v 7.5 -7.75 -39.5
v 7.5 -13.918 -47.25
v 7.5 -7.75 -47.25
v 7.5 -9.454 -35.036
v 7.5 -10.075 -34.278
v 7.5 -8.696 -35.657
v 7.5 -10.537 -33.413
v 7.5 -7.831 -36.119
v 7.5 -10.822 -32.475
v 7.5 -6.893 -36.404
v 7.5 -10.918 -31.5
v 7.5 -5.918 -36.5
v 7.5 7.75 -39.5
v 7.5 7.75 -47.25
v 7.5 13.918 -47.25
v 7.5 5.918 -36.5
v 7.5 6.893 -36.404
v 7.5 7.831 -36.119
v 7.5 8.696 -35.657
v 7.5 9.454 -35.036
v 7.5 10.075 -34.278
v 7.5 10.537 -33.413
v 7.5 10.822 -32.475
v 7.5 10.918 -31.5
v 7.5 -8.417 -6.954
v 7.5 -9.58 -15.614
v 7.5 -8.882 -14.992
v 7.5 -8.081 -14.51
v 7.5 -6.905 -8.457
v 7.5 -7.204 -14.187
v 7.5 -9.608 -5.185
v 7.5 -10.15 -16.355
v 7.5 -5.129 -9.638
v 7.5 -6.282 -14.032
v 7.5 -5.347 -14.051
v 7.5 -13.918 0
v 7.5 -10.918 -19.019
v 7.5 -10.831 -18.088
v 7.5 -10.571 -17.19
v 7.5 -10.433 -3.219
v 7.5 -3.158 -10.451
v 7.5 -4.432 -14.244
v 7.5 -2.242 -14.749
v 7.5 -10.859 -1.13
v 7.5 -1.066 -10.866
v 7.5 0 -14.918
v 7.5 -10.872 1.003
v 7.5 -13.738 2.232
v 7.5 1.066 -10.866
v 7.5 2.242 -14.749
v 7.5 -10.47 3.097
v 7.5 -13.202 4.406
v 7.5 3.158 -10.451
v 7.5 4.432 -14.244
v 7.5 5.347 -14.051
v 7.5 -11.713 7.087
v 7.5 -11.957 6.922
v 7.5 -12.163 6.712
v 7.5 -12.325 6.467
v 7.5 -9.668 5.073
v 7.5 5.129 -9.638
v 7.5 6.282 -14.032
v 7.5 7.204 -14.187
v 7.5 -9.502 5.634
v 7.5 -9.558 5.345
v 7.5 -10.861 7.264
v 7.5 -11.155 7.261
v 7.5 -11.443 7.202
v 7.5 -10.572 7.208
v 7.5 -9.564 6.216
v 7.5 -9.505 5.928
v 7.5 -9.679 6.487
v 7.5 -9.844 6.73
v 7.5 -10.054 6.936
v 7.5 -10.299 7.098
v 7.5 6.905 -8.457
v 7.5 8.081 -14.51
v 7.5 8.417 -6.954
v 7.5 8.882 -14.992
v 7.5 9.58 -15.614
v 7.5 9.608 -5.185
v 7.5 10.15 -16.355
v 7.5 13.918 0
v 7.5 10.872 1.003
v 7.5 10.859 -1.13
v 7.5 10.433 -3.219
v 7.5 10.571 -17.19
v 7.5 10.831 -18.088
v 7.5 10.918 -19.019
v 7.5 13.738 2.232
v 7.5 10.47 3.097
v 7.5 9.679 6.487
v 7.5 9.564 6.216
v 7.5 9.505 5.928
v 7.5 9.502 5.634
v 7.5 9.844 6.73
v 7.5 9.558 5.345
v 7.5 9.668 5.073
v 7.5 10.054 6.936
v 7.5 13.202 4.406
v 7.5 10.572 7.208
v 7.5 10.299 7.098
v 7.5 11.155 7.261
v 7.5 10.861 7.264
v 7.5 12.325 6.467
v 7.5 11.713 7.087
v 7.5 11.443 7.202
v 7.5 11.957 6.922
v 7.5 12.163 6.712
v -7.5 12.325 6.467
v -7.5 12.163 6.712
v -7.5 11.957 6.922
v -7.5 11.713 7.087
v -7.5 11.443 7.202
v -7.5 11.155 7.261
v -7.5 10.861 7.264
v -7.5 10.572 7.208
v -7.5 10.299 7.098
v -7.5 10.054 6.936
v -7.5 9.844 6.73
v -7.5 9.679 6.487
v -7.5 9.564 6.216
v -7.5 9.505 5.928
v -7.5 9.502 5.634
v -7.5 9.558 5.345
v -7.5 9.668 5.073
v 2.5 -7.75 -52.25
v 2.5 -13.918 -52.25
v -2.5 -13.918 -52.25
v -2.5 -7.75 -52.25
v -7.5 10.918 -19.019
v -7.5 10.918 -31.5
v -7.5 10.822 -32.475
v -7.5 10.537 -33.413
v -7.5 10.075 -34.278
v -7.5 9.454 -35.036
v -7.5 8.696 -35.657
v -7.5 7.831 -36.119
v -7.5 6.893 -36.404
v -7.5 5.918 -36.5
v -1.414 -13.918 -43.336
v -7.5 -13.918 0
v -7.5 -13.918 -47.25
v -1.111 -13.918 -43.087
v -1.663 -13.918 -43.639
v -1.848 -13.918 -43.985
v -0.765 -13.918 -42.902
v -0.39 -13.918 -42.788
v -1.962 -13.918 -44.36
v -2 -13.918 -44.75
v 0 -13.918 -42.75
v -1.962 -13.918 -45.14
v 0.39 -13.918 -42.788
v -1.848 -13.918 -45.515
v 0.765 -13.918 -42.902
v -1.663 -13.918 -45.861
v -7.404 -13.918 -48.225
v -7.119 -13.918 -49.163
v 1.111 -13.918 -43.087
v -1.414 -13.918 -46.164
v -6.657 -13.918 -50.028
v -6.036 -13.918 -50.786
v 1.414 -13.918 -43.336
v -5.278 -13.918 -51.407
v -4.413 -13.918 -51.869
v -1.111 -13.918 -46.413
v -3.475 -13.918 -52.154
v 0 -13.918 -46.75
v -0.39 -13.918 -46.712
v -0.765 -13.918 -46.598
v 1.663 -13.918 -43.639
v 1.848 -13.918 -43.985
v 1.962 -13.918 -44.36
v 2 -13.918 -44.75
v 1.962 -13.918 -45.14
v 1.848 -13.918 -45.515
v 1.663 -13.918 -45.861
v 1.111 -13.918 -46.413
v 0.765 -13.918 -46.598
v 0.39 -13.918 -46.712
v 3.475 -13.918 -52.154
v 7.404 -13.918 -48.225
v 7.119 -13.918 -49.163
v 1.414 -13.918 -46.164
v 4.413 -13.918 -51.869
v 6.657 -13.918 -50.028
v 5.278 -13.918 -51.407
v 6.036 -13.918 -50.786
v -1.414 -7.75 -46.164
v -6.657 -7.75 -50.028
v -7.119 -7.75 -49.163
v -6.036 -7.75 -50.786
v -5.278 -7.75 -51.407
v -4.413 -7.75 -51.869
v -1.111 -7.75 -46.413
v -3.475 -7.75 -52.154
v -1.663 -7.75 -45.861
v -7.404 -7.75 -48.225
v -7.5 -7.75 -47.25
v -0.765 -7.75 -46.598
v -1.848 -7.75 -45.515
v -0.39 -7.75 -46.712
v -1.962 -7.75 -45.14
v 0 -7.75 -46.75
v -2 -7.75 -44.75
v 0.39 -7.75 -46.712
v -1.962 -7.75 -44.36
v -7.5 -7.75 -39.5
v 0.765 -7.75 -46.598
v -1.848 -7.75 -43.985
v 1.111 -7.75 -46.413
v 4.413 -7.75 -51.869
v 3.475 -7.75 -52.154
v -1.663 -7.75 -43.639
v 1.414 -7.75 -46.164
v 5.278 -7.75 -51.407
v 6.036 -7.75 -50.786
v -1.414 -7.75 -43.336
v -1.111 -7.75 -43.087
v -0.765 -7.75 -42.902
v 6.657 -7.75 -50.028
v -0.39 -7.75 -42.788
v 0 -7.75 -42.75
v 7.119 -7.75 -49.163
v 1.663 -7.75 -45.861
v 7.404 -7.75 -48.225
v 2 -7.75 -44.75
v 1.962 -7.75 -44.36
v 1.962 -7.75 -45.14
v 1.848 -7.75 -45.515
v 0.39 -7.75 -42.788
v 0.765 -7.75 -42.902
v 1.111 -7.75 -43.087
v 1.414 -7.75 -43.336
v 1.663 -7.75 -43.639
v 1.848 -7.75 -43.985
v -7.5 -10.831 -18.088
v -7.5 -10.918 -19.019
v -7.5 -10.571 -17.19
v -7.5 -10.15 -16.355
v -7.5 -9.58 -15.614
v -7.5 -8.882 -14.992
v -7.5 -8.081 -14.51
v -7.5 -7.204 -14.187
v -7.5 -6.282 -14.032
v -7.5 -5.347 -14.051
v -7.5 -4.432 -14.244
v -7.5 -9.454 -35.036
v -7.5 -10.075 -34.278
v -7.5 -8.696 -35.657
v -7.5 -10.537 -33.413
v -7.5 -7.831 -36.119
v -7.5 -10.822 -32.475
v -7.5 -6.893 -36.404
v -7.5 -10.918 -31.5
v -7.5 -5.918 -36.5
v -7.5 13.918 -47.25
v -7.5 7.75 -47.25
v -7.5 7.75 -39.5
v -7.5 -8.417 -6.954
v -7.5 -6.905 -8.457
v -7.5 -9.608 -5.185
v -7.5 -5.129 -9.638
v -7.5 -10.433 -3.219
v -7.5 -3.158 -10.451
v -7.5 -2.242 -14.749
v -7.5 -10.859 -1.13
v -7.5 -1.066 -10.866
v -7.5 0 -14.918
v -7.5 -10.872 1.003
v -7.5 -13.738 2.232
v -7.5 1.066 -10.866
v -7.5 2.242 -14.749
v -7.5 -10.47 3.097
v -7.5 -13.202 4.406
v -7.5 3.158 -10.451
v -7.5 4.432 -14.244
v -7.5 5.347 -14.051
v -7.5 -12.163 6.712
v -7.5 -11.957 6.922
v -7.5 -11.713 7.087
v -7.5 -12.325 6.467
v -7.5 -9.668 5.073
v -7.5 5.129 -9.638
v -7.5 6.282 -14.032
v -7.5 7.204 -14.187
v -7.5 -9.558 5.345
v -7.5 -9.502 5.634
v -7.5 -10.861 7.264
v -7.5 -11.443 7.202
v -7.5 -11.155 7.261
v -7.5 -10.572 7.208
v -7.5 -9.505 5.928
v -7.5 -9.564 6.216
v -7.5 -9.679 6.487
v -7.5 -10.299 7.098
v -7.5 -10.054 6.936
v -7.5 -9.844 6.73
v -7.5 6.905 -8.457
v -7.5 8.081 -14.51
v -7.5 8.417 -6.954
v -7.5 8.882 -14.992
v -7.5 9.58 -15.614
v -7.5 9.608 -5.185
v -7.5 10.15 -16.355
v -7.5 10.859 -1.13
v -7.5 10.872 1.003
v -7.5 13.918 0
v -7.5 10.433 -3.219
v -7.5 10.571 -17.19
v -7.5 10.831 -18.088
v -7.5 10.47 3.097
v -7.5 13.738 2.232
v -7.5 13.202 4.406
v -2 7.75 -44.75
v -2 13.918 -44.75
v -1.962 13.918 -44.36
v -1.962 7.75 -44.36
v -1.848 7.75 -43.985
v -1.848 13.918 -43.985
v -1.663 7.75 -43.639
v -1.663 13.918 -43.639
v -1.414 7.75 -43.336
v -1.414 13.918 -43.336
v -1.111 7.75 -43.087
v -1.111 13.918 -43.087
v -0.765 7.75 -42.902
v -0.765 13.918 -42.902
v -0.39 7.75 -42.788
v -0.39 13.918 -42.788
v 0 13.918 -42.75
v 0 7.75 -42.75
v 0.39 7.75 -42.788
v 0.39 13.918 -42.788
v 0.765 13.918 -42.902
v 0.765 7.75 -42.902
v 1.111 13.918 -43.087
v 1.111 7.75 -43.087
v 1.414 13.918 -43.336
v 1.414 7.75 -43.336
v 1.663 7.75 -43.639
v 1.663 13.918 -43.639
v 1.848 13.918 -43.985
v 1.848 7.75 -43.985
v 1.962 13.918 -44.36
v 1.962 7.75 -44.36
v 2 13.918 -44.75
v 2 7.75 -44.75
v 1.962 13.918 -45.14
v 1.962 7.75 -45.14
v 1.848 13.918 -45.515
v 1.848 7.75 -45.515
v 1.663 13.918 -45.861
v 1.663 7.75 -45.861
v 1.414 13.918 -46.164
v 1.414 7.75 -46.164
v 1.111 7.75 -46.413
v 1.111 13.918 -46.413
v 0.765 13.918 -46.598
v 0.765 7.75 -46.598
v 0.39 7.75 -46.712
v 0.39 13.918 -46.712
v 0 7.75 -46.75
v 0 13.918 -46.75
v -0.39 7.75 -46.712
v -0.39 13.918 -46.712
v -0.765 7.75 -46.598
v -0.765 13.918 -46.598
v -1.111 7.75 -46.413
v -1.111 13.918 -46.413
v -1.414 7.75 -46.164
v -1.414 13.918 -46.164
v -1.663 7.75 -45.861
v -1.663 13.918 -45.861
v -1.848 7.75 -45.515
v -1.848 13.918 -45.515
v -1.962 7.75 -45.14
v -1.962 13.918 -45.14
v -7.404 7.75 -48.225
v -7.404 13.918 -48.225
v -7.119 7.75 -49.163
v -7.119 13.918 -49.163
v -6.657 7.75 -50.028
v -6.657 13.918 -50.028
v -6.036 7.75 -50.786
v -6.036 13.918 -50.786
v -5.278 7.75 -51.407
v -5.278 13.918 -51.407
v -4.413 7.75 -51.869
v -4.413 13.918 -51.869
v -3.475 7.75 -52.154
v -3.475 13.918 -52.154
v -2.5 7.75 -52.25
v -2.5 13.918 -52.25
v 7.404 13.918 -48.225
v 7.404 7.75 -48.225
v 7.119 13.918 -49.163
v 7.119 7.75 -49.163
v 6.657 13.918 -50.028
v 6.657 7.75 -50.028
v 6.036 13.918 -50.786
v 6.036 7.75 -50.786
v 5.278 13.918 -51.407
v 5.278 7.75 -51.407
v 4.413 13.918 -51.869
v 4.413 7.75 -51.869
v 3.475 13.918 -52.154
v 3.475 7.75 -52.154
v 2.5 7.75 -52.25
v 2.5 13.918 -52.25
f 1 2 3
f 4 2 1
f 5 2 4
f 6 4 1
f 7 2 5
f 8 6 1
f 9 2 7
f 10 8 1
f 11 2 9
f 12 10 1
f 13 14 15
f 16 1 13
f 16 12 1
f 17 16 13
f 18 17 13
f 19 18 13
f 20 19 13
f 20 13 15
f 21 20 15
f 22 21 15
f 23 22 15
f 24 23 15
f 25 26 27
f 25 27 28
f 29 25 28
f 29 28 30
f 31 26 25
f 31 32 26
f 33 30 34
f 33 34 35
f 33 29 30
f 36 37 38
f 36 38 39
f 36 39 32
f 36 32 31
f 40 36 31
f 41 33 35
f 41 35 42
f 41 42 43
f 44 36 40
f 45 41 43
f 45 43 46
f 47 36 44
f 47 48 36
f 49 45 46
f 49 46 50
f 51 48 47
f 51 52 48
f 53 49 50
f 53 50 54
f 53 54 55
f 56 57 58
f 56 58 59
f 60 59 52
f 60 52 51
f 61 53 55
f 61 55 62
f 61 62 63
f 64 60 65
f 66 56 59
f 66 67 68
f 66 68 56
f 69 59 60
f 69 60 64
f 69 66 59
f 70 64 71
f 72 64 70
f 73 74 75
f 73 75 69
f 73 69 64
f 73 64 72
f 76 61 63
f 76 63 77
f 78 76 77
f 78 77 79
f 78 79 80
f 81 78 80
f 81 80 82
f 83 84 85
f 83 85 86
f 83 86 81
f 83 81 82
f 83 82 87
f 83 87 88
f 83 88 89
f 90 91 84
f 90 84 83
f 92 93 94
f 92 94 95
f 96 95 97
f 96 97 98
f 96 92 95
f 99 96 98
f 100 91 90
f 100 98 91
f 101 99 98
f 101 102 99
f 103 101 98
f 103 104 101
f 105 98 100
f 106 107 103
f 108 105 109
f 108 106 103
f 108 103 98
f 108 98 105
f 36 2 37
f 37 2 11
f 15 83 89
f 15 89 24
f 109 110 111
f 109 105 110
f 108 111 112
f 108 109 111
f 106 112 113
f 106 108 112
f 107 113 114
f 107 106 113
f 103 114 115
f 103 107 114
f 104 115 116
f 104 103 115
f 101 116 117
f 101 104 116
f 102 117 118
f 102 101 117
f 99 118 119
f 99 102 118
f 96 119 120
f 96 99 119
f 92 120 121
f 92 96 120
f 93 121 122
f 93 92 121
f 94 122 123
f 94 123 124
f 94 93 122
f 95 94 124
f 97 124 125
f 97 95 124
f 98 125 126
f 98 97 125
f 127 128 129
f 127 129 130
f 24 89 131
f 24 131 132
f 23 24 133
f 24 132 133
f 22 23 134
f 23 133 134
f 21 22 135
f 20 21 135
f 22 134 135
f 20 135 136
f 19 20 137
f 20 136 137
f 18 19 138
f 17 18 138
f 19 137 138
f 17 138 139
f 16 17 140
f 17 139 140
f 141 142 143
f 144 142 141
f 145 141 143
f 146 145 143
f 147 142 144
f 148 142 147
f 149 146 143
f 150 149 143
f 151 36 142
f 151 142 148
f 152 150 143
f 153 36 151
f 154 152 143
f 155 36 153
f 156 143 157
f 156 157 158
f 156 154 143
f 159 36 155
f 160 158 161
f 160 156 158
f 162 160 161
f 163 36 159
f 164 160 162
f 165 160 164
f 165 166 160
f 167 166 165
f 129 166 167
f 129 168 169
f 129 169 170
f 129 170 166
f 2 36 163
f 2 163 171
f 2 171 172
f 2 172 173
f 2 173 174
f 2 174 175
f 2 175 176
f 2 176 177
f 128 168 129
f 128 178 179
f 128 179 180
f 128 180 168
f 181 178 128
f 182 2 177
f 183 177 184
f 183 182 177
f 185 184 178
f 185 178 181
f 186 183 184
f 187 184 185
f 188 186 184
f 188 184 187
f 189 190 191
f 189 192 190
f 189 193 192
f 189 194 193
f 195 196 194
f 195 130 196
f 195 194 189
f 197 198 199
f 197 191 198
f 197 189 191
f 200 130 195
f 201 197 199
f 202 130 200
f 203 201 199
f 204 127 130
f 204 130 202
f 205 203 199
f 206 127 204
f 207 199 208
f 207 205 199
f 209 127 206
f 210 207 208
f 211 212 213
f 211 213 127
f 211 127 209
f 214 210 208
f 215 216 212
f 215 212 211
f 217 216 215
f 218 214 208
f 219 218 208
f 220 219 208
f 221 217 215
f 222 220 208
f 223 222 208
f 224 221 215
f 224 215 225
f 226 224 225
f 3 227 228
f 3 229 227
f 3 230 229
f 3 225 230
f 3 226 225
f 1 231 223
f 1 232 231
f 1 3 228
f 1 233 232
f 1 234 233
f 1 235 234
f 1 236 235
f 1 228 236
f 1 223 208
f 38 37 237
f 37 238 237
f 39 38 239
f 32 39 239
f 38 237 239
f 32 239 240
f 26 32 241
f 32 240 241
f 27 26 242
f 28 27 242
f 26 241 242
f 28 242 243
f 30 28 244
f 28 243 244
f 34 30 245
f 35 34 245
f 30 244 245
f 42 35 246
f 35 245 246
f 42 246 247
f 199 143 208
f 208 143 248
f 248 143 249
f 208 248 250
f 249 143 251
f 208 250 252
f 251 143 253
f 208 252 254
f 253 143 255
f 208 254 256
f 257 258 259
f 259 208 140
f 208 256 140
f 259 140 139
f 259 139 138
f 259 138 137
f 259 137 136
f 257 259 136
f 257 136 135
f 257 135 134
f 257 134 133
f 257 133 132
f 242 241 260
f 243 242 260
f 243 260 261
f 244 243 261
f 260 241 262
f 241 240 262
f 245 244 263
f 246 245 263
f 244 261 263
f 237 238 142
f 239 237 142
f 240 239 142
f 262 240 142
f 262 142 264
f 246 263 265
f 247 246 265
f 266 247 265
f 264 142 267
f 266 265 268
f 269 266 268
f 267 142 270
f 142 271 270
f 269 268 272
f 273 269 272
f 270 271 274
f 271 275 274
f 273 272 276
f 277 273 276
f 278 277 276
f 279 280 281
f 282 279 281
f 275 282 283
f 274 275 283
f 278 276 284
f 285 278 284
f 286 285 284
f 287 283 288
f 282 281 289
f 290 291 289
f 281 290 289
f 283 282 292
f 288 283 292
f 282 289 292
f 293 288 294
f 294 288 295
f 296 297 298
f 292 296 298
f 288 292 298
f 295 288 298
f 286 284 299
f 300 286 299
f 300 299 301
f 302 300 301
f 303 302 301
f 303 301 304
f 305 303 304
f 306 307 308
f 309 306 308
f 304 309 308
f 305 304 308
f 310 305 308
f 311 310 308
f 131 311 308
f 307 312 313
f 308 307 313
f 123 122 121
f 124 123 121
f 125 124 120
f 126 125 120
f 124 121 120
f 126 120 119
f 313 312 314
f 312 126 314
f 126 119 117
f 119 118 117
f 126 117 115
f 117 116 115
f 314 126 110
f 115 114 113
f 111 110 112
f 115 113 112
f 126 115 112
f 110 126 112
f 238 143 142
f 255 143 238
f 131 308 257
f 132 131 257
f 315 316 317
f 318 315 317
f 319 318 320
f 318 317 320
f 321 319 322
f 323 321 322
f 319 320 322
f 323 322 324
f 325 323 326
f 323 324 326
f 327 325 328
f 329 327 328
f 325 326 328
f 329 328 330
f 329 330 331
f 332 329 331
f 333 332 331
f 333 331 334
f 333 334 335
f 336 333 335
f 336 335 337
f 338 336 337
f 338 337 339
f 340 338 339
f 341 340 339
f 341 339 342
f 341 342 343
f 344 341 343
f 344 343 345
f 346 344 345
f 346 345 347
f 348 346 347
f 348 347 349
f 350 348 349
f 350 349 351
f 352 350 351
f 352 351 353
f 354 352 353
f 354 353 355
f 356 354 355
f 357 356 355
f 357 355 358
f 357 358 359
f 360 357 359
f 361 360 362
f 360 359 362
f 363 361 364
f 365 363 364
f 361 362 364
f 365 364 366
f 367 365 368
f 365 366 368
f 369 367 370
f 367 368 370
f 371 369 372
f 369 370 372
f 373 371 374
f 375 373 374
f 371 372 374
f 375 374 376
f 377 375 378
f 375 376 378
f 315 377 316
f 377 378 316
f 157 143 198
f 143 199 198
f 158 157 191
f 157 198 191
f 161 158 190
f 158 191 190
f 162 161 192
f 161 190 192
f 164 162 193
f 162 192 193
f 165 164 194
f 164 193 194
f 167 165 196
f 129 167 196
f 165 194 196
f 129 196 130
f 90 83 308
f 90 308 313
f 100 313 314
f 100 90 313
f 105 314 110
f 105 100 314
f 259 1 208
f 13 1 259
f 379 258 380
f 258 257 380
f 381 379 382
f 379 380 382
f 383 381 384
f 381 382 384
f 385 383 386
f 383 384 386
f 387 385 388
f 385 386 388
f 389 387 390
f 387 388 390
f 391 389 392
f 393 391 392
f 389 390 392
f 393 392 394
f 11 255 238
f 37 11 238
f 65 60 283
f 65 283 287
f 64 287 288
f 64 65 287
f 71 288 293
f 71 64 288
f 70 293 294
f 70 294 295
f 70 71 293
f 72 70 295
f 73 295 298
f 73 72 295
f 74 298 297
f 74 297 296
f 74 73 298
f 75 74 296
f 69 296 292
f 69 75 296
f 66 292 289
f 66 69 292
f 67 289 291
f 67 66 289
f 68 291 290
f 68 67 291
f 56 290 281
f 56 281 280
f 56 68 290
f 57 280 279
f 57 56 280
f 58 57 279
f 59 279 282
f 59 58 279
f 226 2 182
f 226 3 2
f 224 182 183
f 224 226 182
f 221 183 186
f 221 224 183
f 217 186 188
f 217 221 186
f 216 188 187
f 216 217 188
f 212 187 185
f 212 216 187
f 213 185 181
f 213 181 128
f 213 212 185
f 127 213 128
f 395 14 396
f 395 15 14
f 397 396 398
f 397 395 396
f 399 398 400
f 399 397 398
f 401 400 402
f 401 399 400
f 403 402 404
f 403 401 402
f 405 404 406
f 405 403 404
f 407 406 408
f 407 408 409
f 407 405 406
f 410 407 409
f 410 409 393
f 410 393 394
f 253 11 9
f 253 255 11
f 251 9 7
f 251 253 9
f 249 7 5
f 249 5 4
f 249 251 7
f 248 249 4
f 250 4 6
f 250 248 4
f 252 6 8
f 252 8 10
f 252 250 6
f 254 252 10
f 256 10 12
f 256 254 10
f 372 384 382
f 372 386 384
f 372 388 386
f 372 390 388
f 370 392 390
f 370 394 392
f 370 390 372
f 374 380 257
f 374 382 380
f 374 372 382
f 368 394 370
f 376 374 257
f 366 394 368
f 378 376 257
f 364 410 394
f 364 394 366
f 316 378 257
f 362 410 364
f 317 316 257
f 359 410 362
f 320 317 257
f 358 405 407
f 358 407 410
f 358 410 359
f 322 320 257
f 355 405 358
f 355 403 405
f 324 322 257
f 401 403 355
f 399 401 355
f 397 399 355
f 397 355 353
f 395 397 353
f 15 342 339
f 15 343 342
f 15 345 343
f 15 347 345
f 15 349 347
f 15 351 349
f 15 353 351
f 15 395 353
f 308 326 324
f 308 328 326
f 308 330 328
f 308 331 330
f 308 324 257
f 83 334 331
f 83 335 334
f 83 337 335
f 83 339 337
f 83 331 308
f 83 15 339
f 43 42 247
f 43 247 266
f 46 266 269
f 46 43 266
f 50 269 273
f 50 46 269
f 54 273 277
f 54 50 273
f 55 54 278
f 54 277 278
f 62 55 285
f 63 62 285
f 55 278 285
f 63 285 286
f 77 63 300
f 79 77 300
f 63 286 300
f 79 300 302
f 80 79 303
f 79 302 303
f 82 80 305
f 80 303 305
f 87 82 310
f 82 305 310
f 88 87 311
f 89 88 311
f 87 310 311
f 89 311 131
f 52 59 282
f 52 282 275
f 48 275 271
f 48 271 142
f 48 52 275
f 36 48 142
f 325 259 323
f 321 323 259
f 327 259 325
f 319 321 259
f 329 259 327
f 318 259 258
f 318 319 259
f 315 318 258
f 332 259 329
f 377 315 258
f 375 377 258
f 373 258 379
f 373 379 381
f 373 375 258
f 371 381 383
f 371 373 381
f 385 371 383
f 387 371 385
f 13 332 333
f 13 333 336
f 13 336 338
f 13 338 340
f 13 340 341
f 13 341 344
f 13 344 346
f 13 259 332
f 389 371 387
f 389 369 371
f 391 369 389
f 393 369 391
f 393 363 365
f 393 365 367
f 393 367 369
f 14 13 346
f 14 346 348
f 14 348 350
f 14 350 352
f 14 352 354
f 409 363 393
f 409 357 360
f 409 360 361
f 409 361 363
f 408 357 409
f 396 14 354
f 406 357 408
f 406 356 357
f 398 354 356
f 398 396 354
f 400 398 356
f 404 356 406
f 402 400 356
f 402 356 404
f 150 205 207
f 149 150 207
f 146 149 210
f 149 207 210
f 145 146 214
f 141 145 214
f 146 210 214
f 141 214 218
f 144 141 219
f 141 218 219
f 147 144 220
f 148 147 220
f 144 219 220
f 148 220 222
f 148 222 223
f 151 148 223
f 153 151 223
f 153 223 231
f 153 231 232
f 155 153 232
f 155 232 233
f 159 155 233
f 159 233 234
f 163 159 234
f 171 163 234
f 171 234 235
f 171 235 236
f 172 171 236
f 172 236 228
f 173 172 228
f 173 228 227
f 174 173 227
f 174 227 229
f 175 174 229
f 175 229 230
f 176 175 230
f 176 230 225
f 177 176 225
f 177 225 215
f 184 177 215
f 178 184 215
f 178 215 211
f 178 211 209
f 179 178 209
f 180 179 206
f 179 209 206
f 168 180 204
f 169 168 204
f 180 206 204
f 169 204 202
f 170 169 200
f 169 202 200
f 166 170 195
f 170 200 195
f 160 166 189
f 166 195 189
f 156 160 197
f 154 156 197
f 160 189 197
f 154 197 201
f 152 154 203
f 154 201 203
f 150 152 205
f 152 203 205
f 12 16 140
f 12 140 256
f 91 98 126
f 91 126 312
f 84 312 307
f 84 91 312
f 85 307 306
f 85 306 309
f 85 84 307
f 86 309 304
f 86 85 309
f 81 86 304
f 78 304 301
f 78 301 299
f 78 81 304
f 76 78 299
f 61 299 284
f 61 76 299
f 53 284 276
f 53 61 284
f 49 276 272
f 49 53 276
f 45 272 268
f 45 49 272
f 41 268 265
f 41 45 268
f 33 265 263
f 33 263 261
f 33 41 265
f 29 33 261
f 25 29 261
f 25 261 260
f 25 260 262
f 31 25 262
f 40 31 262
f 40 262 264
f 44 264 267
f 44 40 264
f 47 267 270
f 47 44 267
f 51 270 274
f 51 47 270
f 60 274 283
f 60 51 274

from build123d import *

# Parameters (mm, degrees)
F1_DEPTH = 7.5
F3_DEPTH = 15
F4_R     = 2
F5_DEPTH = 27.837
F6_R     = 5


with BuildPart() as f1:
    # F0 (on Right) → F1 (new body, symmetric)
    with BuildSketch(Plane.YZ):
        with BuildLine():
            ThreePointArc((12.3245305001, 6.4665811641), (10.2993352496, 7.0979164137), (9.668, 5.0727211632))
            ThreePointArc((9.668, 5.0727211632), (0, -10.918), (-9.668, 5.0727211632))
            ThreePointArc((-9.668, 5.0727211632), (-10.2993352496, 7.0979164137), (-12.3245305001, 6.4665811641))
            ThreePointArc((-12.3245305001, 6.4665811641), (0, -13.918), (12.3245305001, 6.4665811641))
        make_face()
    extrude(amount=F1_DEPTH, both=True)

    # F2 (on face) → F3 (join, through all)
    with BuildSketch(Plane.YZ.offset(7.5)):
        with BuildLine():
            ThreePointArc((13.918, 0), (0, -13.918), (-13.918, 0))
            Line((-13.918, 0), (-13.918, -52.25))
            Line((-13.918, -52.25), (-7.75, -52.25))
            Line((-7.75, -52.25), (-7.75, -39.5))
            Line((-7.75, -39.5), (7.75, -39.5))
            Line((7.75, -39.5), (7.75, -52.25))
            Line((7.75, -52.25), (13.918, -52.25))
            Line((13.918, -52.25), (13.918, 0))
        make_face()
        with BuildLine():
            Line((-10.918, -36.5), (-10.918, -10.1658251018))
            ThreePointArc((-10.918, -10.1658251018), (0, -14.918), (10.918, -10.1658251018))
            Line((10.918, -10.1658251018), (10.918, -36.5))
            Line((10.918, -36.5), (-10.918, -36.5))
        make_face(mode=Mode.SUBTRACT)
    extrude(amount=-F3_DEPTH)

    # F4 (on face) → F5 (cut, through all)
    with BuildSketch(Plane(origin=(0, 13.918, 0), x_dir=(-1, 0, 0), z_dir=(0, 1, 0))):
        with Locations((0, -44.75)):
            Circle(F4_R)
    extrude(amount=-F5_DEPTH, mode=Mode.SUBTRACT)

    # F6
    f6_edges = [f1.edges().sort_by_distance(p)[0] for p in [
        (7.5, -10.834, -52.25),
        (-7.5, -10.834, -52.25),
        (7.5, 10.834, -52.25),
        (-7.5, 10.834, -52.25),
        (0, -10.918, -10.165825),
        (0, 10.918, -10.165825),
        (0, -10.918, -36.5),
        (0, 10.918, -36.5),
    ]]
    fillet(f6_edges, radius=F6_R)


solid = f1.part
